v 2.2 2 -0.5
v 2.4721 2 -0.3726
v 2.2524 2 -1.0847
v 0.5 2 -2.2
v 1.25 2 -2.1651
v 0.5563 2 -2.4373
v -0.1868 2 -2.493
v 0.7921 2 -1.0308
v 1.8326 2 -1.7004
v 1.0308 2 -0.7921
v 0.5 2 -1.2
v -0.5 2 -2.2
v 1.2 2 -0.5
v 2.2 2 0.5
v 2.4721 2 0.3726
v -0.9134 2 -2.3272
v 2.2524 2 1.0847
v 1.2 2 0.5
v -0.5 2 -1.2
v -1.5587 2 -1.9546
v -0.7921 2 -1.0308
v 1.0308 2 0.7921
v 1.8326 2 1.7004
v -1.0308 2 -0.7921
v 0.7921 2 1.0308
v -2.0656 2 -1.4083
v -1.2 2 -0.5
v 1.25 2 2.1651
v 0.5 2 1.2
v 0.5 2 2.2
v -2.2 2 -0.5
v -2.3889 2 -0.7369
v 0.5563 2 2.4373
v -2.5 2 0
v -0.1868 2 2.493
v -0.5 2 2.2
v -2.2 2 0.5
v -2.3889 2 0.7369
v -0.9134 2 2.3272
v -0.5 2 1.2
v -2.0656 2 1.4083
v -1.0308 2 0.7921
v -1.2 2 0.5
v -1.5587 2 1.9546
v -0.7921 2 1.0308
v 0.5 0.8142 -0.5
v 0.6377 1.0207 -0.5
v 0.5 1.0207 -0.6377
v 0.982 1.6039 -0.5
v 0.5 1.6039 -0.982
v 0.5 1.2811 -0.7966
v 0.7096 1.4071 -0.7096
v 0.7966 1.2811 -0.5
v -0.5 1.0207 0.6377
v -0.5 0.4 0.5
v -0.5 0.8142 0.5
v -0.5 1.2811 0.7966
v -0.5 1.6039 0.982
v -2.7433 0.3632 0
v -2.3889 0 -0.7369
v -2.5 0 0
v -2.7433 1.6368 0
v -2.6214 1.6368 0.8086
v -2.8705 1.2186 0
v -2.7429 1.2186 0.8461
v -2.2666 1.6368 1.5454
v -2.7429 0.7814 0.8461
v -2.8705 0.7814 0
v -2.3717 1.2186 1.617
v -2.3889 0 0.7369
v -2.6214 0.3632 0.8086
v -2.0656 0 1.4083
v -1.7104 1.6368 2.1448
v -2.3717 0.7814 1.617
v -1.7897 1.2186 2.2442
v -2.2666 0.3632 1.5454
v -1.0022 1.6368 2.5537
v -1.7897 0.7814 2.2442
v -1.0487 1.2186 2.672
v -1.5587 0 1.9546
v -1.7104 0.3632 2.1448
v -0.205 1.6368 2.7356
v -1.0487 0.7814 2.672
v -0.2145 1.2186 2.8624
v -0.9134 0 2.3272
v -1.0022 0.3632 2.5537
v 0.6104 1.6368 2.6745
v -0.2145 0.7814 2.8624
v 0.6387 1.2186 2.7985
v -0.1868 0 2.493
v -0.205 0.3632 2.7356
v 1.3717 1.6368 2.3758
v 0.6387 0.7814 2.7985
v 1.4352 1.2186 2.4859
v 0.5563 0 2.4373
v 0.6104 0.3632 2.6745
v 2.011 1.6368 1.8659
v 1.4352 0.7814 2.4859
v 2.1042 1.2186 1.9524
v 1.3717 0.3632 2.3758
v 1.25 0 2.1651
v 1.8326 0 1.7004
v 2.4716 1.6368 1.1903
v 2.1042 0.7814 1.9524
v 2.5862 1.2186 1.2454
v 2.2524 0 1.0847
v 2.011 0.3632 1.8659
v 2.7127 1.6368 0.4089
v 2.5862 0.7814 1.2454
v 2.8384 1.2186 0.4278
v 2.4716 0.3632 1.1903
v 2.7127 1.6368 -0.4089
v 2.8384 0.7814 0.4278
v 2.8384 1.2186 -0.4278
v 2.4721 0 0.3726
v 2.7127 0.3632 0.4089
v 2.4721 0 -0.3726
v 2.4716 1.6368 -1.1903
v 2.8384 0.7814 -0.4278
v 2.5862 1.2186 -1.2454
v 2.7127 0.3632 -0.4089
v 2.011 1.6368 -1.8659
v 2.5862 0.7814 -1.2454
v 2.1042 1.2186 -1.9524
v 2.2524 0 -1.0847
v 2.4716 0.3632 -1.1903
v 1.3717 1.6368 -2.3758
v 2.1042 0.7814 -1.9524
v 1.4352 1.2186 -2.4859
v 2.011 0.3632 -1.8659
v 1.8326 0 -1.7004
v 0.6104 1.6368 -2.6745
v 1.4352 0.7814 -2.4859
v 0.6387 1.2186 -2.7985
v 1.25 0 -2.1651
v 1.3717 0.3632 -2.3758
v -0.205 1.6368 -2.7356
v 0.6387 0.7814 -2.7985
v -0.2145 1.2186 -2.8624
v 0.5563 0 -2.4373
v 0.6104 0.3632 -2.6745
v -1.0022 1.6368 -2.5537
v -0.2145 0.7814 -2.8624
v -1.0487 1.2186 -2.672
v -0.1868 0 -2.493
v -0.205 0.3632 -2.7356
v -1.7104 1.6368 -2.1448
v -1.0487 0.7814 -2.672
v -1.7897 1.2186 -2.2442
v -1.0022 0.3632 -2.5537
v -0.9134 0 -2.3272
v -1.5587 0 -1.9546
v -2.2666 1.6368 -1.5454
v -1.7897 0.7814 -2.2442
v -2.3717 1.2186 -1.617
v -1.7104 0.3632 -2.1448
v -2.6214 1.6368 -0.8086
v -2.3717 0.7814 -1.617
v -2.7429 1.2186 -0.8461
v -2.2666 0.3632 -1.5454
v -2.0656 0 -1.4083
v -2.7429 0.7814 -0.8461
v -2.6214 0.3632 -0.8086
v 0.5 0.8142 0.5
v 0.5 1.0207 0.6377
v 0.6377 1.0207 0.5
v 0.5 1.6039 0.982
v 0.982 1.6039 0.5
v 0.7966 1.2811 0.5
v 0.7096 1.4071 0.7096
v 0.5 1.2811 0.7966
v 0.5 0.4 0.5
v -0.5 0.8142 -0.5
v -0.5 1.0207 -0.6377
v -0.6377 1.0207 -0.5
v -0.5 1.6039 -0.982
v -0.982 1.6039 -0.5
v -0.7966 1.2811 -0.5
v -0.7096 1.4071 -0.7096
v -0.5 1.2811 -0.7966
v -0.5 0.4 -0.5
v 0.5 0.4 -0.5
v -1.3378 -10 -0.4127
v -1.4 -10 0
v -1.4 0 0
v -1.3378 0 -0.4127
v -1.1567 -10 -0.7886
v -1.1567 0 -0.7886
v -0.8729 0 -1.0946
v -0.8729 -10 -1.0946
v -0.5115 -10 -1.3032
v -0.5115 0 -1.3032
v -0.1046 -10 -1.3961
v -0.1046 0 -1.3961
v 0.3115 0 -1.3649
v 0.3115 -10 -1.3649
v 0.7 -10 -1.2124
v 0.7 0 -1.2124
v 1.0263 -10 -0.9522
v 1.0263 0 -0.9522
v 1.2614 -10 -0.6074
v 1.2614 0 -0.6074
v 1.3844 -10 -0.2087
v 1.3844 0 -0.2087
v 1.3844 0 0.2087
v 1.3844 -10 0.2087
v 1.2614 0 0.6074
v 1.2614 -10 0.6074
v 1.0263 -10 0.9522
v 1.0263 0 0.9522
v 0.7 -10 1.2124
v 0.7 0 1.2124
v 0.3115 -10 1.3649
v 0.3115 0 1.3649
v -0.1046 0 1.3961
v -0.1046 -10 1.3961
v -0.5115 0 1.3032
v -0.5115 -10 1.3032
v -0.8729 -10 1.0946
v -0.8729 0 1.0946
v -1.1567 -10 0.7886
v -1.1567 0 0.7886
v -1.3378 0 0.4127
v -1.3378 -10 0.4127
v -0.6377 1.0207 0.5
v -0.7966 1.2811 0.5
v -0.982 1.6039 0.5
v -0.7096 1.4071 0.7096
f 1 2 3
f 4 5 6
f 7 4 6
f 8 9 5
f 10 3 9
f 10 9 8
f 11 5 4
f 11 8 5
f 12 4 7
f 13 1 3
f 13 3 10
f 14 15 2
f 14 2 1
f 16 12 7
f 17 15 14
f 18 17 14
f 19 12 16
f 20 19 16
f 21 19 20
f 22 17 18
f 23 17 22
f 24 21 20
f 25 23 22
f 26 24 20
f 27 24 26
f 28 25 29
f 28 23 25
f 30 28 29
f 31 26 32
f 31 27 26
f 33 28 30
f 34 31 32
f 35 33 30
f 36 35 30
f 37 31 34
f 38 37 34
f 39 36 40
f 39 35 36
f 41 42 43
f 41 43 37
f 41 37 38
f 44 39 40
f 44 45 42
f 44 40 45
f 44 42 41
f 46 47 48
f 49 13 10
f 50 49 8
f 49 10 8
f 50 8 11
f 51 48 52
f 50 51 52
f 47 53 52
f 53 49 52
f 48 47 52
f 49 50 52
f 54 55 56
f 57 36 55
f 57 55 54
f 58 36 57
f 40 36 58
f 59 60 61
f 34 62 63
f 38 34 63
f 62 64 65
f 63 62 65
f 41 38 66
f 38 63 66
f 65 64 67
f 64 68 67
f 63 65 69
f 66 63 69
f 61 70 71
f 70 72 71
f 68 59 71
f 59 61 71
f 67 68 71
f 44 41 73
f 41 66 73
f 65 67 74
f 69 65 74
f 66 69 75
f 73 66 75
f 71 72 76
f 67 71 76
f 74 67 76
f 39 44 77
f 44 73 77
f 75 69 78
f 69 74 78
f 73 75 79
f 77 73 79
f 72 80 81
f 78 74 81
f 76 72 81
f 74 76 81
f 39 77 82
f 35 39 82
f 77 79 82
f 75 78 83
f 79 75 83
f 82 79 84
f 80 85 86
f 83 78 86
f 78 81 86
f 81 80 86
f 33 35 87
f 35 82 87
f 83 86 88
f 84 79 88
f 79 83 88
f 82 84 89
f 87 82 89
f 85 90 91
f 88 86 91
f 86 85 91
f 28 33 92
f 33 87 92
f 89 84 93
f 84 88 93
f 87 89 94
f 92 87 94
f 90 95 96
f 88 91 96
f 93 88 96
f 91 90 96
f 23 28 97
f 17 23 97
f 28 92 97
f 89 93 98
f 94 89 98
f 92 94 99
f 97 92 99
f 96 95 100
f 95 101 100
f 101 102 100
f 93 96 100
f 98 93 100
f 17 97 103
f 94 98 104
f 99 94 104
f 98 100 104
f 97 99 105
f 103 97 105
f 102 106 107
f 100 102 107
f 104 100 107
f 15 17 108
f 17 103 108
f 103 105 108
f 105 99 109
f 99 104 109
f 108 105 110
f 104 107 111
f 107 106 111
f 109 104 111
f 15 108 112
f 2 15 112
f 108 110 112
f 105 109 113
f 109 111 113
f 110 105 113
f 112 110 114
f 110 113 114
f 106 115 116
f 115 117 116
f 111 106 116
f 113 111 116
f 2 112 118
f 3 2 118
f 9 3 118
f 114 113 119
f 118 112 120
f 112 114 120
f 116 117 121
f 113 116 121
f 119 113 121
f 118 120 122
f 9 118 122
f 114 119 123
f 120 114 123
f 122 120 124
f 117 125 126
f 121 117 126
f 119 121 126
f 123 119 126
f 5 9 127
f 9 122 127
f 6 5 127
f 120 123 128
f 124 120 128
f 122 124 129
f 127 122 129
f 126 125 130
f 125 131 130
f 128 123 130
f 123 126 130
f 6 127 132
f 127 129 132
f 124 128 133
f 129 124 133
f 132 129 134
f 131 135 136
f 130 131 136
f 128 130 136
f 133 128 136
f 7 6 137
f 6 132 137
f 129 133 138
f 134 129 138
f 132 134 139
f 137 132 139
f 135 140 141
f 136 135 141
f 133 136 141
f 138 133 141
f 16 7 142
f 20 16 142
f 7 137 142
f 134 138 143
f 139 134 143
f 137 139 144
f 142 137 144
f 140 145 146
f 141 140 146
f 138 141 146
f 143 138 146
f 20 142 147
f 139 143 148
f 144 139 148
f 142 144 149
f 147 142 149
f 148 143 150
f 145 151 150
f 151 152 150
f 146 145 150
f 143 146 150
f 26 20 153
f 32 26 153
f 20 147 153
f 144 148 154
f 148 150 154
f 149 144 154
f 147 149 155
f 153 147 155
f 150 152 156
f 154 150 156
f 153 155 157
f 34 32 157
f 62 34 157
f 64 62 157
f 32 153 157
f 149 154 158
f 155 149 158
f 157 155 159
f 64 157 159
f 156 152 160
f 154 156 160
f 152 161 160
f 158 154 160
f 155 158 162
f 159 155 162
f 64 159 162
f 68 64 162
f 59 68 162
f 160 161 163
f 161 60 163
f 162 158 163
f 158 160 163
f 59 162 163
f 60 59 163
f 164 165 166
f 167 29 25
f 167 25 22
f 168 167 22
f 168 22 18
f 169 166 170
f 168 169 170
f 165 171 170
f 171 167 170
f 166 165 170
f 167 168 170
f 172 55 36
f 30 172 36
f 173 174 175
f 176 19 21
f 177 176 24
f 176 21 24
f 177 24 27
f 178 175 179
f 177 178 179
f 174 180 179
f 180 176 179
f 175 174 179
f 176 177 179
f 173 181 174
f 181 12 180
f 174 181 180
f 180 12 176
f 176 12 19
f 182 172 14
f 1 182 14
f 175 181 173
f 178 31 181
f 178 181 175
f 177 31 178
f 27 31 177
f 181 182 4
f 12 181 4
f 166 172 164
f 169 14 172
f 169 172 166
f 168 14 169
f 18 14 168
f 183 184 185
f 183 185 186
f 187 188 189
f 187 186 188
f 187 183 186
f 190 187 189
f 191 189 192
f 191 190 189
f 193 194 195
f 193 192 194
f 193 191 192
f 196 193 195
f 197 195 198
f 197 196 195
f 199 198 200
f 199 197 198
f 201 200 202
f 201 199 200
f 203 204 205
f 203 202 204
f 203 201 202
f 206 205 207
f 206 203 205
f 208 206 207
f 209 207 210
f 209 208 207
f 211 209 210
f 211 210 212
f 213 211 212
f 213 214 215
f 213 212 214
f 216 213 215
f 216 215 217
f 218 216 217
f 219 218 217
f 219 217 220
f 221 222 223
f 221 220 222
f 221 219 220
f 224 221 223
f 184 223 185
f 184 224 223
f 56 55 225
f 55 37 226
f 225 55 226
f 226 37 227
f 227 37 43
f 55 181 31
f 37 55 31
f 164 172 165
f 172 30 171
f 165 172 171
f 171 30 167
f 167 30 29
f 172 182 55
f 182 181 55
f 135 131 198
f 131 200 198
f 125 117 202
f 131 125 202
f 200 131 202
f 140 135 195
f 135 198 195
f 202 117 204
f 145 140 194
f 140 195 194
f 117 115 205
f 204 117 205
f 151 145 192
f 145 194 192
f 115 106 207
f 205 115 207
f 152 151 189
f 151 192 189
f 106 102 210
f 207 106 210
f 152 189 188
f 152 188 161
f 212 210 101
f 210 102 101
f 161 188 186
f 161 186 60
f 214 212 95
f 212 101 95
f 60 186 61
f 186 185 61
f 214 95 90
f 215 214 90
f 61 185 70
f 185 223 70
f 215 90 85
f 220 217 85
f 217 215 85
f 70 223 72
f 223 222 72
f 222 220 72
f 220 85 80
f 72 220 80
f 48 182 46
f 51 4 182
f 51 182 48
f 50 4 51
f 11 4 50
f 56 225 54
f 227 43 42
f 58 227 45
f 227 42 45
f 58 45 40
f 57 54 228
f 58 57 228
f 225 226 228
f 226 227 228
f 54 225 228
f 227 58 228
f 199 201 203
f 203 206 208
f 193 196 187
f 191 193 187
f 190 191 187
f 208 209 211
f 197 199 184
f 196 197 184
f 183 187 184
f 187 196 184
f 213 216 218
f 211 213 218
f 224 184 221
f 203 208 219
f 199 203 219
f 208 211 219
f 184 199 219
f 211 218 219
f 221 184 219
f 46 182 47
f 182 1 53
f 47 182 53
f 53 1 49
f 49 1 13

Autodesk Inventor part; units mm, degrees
ref_plane "YZ Plane" through (0, 0, 0) normal (1, 0, 0) x (0, 1, 0)
ref_plane "XZ Plane" through (0, 0, 0) normal (0, 1, 0) x (-1, 0, 0)
ref_plane "XY Plane" through (0, 0, 0) normal (0, 0, 1) x (1, 0, 0)
sketch "Эскиз3" plane through (0, 0, 0) normal (0, 0, 1) x (1, 0, 0)
  line L0 (-1.4, 0) -> (-1.4, -10)
  line L1 (-1.4, -10) -> (0, -10)
  line L2 (0, -10) -> (0, 2)
  line L3 (-1.4, 0) -> (-2.5, 0)
  arc A0 (-2.5, 2) -> (-2.5, 0) centre (-1.4, 1) ccw
  line L4 (-1.3, 2) -> (-0.5, 0.4)
  line L5 (-0.5, 0.4) -> (0, 0.4)
  line L6 (-2.5, 2) -> (-1.3, 2)
  point P0 (0, 0)
  dimension "d4" = 2.8
  dimension "d6" = 1
  dimension "d7" = 5
  dimension "d8" = 10
  dimension "d10" = 2
  dimension "d12" = 2.6
  dimension "d13" = 0.4
  dimension "d14" = 1
revolve "Вращение1" add sketch "Эскиз3" angle 360 about axis through (0, -10, 0) along (0, 1, 0)
sketch "Эскиз5" plane through (0, 0, 0) normal (0, 0, 1) x (1, 0, 0)
  line L0 (0.5, 0.4) -> (-0.5, 0.4) projected
  line L1 (-0.5, 0.4) -> (-2.2, 2)
  line L2 (2.5, 2) -> (-2.5, 2) projected
  line L3 (-2.2, 2) -> (0, 2)
  line L4 (1.3, 2) -> (-1.3, 2) projected
  line L5 (0, 0.4) -> (-0.5, 0.4)
  line L6 (0, 0.4) -> (0, 2)
  point P0 (0, 0)
  dimension "d15" = 2.2
extrude "Выдавливание2" cut sketch "Эскиз5" along normal mid plane 1
pattern_circular "Круговой массив1" count 4 over 360 about axis through (0, -10, 0) along (0, 1, 0) of "Выдавливание2"
thread "Резьба1" size "M3x0.5" class "6g" standard "ANSI Metric M Profile" full length
properties part number "M3x16" material "Сталь, литейная"
